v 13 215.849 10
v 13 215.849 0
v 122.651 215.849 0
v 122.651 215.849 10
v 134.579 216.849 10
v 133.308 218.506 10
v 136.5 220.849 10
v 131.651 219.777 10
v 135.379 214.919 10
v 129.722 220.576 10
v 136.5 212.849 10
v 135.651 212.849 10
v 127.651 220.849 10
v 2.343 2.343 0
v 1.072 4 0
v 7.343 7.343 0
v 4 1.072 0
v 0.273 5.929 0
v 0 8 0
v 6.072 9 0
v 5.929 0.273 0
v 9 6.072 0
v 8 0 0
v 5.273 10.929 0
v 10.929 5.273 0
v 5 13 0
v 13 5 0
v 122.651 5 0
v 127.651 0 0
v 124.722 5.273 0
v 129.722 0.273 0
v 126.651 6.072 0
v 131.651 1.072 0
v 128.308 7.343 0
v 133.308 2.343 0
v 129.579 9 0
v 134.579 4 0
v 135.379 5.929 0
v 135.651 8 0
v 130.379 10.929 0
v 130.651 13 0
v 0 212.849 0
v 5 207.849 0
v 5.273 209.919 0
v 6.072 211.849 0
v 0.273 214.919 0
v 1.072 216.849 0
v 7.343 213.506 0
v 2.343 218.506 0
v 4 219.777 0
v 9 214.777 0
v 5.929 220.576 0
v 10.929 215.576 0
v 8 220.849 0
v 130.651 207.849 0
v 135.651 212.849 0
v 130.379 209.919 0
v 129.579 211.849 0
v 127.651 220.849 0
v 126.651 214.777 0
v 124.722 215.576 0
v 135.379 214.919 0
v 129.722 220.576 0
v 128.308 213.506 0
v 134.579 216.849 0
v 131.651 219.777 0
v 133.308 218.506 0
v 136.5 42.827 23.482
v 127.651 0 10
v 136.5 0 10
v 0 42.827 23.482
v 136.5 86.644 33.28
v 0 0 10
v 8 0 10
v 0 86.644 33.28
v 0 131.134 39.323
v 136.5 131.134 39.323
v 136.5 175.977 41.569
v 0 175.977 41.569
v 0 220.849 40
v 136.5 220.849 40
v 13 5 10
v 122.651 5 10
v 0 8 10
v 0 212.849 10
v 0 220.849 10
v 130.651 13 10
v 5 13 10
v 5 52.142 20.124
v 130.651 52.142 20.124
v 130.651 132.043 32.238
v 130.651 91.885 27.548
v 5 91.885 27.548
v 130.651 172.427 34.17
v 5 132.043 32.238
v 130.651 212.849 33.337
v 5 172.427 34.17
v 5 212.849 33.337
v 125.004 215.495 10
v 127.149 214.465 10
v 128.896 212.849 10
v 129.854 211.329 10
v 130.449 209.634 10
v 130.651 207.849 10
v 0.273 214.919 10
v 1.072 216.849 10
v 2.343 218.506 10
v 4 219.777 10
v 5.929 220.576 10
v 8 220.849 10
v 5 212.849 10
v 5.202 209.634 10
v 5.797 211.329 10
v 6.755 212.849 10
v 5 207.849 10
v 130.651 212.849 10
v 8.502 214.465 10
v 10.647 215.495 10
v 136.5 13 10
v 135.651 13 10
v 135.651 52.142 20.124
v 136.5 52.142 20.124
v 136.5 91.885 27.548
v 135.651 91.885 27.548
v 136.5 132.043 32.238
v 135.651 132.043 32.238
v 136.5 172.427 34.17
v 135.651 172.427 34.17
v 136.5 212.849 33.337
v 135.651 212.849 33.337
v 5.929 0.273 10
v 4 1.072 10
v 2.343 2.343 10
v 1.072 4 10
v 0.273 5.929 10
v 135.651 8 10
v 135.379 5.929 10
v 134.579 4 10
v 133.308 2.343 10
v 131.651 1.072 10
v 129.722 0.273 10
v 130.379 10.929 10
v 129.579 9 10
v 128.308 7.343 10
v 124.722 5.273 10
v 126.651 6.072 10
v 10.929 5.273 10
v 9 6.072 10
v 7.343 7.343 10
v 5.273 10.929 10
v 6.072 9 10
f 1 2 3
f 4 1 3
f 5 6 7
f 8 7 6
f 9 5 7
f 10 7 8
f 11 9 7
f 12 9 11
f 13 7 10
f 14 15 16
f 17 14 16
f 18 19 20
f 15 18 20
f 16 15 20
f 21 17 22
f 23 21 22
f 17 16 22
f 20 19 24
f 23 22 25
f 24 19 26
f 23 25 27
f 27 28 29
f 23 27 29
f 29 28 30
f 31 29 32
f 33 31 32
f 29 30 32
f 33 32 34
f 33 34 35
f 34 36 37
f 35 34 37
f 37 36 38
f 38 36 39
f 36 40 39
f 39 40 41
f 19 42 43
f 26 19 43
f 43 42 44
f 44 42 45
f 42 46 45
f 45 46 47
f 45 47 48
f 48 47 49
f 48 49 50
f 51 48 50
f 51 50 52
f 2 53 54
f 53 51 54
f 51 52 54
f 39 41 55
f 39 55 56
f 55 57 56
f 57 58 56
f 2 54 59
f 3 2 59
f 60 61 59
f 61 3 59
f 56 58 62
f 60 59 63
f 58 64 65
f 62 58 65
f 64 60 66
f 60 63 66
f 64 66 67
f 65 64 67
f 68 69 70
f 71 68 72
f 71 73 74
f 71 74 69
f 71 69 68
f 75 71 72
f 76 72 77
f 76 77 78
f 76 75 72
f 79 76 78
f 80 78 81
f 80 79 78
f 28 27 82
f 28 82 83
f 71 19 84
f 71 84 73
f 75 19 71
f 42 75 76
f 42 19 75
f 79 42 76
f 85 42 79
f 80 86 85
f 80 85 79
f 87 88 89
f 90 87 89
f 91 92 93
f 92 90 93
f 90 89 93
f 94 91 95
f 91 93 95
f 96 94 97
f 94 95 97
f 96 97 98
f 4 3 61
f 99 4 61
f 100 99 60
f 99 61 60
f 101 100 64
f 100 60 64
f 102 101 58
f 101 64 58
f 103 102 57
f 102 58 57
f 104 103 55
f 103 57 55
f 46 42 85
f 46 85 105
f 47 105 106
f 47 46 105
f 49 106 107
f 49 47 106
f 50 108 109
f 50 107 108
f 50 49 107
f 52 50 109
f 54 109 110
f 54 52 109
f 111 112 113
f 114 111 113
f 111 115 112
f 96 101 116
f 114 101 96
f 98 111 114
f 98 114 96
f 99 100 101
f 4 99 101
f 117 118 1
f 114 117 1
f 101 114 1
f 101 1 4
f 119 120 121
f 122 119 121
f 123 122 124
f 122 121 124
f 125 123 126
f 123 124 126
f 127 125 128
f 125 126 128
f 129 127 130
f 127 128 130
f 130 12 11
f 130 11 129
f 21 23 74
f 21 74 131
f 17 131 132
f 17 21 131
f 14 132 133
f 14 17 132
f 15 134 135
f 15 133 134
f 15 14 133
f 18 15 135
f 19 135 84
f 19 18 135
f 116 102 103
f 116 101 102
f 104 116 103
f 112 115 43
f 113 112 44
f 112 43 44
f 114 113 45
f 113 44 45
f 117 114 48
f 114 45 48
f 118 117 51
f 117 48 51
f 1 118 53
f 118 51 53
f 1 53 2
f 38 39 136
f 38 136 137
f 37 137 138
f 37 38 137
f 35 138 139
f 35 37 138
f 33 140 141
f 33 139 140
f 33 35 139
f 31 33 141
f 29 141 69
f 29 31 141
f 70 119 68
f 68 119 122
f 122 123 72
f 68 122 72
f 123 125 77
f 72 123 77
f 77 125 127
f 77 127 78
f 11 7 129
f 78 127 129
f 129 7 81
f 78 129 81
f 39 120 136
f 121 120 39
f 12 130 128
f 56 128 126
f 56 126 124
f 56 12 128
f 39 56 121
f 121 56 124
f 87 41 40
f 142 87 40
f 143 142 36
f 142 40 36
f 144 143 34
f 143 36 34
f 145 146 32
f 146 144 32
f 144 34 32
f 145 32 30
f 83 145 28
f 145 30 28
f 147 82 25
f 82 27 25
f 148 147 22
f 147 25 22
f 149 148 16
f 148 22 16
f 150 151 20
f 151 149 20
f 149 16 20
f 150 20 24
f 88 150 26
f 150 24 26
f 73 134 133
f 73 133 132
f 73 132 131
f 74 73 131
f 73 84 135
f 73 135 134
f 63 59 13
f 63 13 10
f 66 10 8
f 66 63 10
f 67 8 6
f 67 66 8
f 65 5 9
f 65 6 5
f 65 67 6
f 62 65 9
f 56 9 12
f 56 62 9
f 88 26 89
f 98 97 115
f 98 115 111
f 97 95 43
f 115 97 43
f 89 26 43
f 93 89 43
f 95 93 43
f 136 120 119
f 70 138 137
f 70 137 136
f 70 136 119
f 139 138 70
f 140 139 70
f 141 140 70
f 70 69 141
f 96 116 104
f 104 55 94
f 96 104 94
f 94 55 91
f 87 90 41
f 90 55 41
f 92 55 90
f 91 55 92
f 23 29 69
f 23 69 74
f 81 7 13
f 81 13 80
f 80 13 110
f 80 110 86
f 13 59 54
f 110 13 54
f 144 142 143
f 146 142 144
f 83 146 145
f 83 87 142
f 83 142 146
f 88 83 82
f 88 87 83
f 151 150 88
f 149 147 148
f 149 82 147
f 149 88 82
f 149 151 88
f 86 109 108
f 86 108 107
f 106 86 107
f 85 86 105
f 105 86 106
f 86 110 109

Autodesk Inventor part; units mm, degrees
ref_plane "YZ Plane" through (0, 0, 0) normal (1, 0, 0) x (0, 1, 0)
ref_plane "XZ Plane" through (0, 0, 0) normal (0, 1, 0) x (-1, 0, 0)
ref_plane "XY Plane" through (0, 0, 0) normal (0, 0, 1) x (1, 0, 0)
sketch "Эскиз1" plane through (0, 0, 0) normal (0, 0, 1) x (1, 0, 0)
  line L0 (5, 13) -> (5, 207.8488) projected
  arc A0 (13, 215.8488) -> (5, 207.8488) centre (13, 207.8488) ccw projected
  line L1 (13, 215.8488) -> (122.6512, 215.8488) projected
  arc A1 (130.6512, 207.8488) -> (122.6512, 215.8488) centre (122.6512, 207.8488) ccw projected
  line L2 (130.6512, 207.8488) -> (130.6512, 13) projected
  arc A2 (122.6512, 5) -> (130.6512, 13) centre (122.6512, 13) ccw projected
  line L3 (13, 5) -> (122.6512, 5) projected
  arc A3 (5, 13) -> (13, 5) centre (13, 13) ccw projected
  arc A4 (127.6512, 0) -> (135.6512, 8) centre (127.6512, 8) ccw projected
  line L4 (135.6512, 8) -> (135.6512, 212.8488) projected
  arc A5 (135.6512, 212.8488) -> (127.6512, 220.8488) centre (127.6512, 212.8488) ccw projected
  line L5 (127.6512, 220.8488) -> (8, 220.8488) projected
  arc A6 (8, 220.8488) -> (0, 212.8488) centre (8, 212.8488) ccw projected
  line L6 (0, 8) -> (0, 212.8488) projected
  arc A7 (0, 8) -> (8, 0) centre (8, 8) ccw projected
  line L7 (127.6512, 0) -> (8, 0) projected
  point P0 (0, 0)
extrude "Выдавливание1" add sketch "Эскиз1" along normal blind 10
sketch "Эскиз2" plane through (0, 8, 0) normal (-1, 0, 0) x (0, 0, 1)
  line L0 (0, 212.8488) -> (10, 212.8488) projected
  line L1 (10, 212.8488) -> (40, 212.8488)
  arc A0 (10, -8) -> (40, 212.8488) centre (-486.9233, 171.9638) ccw
  line L2 (10, 212.8488) -> (10, -8)
  line L3 (10, 5) -> (10, -3) projected
  arc A1 (10, 5) -> (32.8436, 212.8488) centre (-556.7291, 172.466) ccw
  line L4 (0, 204.8488) -> (10, 204.8488) projected
  line L5 (10, 204.8488) -> (33.3371, 204.8488)
  point P0 (0, -8)
  dimension "d2" = 30
extrude "Выдавливание2" add sketch "Эскиз2" against normal blind 136.5 contours L1 A1 L5 L2 | L1 A0 L2 A1
sketch "Эскиз3" plane through (135.6512, 8, 0) normal (1, 0, 0) x (0, 0, -1)
  line L0 (-10, 5) -> (-10, 204.8488) projected
  arc A0 (-33.3371, 204.8488) -> (-10, 5) centre (556.7291, 172.466) ccw projected
  line L1 (-33.3371, 204.8488) -> (-10, 204.8488) projected
  point P0 (0, -8)
extrude "Выдавливание3" add sketch "Эскиз3" against normal blind 5
sketch "Эскиз4" plane through (0, 8, 0) normal (-1, 0, 0) x (0, 0, 1)
  arc A0 (10, 5) -> (33.3371, 204.8488) centre (-556.7291, 172.466) ccw projected
  line L0 (10, 204.8488) -> (10, 5) projected
  line L1 (10, 204.8488) -> (33.3371, 204.8488) projected
  point P0 (0, -8)
extrude "Выдавливание4" add sketch "Эскиз4" against normal blind 5
properties part number "krish"
